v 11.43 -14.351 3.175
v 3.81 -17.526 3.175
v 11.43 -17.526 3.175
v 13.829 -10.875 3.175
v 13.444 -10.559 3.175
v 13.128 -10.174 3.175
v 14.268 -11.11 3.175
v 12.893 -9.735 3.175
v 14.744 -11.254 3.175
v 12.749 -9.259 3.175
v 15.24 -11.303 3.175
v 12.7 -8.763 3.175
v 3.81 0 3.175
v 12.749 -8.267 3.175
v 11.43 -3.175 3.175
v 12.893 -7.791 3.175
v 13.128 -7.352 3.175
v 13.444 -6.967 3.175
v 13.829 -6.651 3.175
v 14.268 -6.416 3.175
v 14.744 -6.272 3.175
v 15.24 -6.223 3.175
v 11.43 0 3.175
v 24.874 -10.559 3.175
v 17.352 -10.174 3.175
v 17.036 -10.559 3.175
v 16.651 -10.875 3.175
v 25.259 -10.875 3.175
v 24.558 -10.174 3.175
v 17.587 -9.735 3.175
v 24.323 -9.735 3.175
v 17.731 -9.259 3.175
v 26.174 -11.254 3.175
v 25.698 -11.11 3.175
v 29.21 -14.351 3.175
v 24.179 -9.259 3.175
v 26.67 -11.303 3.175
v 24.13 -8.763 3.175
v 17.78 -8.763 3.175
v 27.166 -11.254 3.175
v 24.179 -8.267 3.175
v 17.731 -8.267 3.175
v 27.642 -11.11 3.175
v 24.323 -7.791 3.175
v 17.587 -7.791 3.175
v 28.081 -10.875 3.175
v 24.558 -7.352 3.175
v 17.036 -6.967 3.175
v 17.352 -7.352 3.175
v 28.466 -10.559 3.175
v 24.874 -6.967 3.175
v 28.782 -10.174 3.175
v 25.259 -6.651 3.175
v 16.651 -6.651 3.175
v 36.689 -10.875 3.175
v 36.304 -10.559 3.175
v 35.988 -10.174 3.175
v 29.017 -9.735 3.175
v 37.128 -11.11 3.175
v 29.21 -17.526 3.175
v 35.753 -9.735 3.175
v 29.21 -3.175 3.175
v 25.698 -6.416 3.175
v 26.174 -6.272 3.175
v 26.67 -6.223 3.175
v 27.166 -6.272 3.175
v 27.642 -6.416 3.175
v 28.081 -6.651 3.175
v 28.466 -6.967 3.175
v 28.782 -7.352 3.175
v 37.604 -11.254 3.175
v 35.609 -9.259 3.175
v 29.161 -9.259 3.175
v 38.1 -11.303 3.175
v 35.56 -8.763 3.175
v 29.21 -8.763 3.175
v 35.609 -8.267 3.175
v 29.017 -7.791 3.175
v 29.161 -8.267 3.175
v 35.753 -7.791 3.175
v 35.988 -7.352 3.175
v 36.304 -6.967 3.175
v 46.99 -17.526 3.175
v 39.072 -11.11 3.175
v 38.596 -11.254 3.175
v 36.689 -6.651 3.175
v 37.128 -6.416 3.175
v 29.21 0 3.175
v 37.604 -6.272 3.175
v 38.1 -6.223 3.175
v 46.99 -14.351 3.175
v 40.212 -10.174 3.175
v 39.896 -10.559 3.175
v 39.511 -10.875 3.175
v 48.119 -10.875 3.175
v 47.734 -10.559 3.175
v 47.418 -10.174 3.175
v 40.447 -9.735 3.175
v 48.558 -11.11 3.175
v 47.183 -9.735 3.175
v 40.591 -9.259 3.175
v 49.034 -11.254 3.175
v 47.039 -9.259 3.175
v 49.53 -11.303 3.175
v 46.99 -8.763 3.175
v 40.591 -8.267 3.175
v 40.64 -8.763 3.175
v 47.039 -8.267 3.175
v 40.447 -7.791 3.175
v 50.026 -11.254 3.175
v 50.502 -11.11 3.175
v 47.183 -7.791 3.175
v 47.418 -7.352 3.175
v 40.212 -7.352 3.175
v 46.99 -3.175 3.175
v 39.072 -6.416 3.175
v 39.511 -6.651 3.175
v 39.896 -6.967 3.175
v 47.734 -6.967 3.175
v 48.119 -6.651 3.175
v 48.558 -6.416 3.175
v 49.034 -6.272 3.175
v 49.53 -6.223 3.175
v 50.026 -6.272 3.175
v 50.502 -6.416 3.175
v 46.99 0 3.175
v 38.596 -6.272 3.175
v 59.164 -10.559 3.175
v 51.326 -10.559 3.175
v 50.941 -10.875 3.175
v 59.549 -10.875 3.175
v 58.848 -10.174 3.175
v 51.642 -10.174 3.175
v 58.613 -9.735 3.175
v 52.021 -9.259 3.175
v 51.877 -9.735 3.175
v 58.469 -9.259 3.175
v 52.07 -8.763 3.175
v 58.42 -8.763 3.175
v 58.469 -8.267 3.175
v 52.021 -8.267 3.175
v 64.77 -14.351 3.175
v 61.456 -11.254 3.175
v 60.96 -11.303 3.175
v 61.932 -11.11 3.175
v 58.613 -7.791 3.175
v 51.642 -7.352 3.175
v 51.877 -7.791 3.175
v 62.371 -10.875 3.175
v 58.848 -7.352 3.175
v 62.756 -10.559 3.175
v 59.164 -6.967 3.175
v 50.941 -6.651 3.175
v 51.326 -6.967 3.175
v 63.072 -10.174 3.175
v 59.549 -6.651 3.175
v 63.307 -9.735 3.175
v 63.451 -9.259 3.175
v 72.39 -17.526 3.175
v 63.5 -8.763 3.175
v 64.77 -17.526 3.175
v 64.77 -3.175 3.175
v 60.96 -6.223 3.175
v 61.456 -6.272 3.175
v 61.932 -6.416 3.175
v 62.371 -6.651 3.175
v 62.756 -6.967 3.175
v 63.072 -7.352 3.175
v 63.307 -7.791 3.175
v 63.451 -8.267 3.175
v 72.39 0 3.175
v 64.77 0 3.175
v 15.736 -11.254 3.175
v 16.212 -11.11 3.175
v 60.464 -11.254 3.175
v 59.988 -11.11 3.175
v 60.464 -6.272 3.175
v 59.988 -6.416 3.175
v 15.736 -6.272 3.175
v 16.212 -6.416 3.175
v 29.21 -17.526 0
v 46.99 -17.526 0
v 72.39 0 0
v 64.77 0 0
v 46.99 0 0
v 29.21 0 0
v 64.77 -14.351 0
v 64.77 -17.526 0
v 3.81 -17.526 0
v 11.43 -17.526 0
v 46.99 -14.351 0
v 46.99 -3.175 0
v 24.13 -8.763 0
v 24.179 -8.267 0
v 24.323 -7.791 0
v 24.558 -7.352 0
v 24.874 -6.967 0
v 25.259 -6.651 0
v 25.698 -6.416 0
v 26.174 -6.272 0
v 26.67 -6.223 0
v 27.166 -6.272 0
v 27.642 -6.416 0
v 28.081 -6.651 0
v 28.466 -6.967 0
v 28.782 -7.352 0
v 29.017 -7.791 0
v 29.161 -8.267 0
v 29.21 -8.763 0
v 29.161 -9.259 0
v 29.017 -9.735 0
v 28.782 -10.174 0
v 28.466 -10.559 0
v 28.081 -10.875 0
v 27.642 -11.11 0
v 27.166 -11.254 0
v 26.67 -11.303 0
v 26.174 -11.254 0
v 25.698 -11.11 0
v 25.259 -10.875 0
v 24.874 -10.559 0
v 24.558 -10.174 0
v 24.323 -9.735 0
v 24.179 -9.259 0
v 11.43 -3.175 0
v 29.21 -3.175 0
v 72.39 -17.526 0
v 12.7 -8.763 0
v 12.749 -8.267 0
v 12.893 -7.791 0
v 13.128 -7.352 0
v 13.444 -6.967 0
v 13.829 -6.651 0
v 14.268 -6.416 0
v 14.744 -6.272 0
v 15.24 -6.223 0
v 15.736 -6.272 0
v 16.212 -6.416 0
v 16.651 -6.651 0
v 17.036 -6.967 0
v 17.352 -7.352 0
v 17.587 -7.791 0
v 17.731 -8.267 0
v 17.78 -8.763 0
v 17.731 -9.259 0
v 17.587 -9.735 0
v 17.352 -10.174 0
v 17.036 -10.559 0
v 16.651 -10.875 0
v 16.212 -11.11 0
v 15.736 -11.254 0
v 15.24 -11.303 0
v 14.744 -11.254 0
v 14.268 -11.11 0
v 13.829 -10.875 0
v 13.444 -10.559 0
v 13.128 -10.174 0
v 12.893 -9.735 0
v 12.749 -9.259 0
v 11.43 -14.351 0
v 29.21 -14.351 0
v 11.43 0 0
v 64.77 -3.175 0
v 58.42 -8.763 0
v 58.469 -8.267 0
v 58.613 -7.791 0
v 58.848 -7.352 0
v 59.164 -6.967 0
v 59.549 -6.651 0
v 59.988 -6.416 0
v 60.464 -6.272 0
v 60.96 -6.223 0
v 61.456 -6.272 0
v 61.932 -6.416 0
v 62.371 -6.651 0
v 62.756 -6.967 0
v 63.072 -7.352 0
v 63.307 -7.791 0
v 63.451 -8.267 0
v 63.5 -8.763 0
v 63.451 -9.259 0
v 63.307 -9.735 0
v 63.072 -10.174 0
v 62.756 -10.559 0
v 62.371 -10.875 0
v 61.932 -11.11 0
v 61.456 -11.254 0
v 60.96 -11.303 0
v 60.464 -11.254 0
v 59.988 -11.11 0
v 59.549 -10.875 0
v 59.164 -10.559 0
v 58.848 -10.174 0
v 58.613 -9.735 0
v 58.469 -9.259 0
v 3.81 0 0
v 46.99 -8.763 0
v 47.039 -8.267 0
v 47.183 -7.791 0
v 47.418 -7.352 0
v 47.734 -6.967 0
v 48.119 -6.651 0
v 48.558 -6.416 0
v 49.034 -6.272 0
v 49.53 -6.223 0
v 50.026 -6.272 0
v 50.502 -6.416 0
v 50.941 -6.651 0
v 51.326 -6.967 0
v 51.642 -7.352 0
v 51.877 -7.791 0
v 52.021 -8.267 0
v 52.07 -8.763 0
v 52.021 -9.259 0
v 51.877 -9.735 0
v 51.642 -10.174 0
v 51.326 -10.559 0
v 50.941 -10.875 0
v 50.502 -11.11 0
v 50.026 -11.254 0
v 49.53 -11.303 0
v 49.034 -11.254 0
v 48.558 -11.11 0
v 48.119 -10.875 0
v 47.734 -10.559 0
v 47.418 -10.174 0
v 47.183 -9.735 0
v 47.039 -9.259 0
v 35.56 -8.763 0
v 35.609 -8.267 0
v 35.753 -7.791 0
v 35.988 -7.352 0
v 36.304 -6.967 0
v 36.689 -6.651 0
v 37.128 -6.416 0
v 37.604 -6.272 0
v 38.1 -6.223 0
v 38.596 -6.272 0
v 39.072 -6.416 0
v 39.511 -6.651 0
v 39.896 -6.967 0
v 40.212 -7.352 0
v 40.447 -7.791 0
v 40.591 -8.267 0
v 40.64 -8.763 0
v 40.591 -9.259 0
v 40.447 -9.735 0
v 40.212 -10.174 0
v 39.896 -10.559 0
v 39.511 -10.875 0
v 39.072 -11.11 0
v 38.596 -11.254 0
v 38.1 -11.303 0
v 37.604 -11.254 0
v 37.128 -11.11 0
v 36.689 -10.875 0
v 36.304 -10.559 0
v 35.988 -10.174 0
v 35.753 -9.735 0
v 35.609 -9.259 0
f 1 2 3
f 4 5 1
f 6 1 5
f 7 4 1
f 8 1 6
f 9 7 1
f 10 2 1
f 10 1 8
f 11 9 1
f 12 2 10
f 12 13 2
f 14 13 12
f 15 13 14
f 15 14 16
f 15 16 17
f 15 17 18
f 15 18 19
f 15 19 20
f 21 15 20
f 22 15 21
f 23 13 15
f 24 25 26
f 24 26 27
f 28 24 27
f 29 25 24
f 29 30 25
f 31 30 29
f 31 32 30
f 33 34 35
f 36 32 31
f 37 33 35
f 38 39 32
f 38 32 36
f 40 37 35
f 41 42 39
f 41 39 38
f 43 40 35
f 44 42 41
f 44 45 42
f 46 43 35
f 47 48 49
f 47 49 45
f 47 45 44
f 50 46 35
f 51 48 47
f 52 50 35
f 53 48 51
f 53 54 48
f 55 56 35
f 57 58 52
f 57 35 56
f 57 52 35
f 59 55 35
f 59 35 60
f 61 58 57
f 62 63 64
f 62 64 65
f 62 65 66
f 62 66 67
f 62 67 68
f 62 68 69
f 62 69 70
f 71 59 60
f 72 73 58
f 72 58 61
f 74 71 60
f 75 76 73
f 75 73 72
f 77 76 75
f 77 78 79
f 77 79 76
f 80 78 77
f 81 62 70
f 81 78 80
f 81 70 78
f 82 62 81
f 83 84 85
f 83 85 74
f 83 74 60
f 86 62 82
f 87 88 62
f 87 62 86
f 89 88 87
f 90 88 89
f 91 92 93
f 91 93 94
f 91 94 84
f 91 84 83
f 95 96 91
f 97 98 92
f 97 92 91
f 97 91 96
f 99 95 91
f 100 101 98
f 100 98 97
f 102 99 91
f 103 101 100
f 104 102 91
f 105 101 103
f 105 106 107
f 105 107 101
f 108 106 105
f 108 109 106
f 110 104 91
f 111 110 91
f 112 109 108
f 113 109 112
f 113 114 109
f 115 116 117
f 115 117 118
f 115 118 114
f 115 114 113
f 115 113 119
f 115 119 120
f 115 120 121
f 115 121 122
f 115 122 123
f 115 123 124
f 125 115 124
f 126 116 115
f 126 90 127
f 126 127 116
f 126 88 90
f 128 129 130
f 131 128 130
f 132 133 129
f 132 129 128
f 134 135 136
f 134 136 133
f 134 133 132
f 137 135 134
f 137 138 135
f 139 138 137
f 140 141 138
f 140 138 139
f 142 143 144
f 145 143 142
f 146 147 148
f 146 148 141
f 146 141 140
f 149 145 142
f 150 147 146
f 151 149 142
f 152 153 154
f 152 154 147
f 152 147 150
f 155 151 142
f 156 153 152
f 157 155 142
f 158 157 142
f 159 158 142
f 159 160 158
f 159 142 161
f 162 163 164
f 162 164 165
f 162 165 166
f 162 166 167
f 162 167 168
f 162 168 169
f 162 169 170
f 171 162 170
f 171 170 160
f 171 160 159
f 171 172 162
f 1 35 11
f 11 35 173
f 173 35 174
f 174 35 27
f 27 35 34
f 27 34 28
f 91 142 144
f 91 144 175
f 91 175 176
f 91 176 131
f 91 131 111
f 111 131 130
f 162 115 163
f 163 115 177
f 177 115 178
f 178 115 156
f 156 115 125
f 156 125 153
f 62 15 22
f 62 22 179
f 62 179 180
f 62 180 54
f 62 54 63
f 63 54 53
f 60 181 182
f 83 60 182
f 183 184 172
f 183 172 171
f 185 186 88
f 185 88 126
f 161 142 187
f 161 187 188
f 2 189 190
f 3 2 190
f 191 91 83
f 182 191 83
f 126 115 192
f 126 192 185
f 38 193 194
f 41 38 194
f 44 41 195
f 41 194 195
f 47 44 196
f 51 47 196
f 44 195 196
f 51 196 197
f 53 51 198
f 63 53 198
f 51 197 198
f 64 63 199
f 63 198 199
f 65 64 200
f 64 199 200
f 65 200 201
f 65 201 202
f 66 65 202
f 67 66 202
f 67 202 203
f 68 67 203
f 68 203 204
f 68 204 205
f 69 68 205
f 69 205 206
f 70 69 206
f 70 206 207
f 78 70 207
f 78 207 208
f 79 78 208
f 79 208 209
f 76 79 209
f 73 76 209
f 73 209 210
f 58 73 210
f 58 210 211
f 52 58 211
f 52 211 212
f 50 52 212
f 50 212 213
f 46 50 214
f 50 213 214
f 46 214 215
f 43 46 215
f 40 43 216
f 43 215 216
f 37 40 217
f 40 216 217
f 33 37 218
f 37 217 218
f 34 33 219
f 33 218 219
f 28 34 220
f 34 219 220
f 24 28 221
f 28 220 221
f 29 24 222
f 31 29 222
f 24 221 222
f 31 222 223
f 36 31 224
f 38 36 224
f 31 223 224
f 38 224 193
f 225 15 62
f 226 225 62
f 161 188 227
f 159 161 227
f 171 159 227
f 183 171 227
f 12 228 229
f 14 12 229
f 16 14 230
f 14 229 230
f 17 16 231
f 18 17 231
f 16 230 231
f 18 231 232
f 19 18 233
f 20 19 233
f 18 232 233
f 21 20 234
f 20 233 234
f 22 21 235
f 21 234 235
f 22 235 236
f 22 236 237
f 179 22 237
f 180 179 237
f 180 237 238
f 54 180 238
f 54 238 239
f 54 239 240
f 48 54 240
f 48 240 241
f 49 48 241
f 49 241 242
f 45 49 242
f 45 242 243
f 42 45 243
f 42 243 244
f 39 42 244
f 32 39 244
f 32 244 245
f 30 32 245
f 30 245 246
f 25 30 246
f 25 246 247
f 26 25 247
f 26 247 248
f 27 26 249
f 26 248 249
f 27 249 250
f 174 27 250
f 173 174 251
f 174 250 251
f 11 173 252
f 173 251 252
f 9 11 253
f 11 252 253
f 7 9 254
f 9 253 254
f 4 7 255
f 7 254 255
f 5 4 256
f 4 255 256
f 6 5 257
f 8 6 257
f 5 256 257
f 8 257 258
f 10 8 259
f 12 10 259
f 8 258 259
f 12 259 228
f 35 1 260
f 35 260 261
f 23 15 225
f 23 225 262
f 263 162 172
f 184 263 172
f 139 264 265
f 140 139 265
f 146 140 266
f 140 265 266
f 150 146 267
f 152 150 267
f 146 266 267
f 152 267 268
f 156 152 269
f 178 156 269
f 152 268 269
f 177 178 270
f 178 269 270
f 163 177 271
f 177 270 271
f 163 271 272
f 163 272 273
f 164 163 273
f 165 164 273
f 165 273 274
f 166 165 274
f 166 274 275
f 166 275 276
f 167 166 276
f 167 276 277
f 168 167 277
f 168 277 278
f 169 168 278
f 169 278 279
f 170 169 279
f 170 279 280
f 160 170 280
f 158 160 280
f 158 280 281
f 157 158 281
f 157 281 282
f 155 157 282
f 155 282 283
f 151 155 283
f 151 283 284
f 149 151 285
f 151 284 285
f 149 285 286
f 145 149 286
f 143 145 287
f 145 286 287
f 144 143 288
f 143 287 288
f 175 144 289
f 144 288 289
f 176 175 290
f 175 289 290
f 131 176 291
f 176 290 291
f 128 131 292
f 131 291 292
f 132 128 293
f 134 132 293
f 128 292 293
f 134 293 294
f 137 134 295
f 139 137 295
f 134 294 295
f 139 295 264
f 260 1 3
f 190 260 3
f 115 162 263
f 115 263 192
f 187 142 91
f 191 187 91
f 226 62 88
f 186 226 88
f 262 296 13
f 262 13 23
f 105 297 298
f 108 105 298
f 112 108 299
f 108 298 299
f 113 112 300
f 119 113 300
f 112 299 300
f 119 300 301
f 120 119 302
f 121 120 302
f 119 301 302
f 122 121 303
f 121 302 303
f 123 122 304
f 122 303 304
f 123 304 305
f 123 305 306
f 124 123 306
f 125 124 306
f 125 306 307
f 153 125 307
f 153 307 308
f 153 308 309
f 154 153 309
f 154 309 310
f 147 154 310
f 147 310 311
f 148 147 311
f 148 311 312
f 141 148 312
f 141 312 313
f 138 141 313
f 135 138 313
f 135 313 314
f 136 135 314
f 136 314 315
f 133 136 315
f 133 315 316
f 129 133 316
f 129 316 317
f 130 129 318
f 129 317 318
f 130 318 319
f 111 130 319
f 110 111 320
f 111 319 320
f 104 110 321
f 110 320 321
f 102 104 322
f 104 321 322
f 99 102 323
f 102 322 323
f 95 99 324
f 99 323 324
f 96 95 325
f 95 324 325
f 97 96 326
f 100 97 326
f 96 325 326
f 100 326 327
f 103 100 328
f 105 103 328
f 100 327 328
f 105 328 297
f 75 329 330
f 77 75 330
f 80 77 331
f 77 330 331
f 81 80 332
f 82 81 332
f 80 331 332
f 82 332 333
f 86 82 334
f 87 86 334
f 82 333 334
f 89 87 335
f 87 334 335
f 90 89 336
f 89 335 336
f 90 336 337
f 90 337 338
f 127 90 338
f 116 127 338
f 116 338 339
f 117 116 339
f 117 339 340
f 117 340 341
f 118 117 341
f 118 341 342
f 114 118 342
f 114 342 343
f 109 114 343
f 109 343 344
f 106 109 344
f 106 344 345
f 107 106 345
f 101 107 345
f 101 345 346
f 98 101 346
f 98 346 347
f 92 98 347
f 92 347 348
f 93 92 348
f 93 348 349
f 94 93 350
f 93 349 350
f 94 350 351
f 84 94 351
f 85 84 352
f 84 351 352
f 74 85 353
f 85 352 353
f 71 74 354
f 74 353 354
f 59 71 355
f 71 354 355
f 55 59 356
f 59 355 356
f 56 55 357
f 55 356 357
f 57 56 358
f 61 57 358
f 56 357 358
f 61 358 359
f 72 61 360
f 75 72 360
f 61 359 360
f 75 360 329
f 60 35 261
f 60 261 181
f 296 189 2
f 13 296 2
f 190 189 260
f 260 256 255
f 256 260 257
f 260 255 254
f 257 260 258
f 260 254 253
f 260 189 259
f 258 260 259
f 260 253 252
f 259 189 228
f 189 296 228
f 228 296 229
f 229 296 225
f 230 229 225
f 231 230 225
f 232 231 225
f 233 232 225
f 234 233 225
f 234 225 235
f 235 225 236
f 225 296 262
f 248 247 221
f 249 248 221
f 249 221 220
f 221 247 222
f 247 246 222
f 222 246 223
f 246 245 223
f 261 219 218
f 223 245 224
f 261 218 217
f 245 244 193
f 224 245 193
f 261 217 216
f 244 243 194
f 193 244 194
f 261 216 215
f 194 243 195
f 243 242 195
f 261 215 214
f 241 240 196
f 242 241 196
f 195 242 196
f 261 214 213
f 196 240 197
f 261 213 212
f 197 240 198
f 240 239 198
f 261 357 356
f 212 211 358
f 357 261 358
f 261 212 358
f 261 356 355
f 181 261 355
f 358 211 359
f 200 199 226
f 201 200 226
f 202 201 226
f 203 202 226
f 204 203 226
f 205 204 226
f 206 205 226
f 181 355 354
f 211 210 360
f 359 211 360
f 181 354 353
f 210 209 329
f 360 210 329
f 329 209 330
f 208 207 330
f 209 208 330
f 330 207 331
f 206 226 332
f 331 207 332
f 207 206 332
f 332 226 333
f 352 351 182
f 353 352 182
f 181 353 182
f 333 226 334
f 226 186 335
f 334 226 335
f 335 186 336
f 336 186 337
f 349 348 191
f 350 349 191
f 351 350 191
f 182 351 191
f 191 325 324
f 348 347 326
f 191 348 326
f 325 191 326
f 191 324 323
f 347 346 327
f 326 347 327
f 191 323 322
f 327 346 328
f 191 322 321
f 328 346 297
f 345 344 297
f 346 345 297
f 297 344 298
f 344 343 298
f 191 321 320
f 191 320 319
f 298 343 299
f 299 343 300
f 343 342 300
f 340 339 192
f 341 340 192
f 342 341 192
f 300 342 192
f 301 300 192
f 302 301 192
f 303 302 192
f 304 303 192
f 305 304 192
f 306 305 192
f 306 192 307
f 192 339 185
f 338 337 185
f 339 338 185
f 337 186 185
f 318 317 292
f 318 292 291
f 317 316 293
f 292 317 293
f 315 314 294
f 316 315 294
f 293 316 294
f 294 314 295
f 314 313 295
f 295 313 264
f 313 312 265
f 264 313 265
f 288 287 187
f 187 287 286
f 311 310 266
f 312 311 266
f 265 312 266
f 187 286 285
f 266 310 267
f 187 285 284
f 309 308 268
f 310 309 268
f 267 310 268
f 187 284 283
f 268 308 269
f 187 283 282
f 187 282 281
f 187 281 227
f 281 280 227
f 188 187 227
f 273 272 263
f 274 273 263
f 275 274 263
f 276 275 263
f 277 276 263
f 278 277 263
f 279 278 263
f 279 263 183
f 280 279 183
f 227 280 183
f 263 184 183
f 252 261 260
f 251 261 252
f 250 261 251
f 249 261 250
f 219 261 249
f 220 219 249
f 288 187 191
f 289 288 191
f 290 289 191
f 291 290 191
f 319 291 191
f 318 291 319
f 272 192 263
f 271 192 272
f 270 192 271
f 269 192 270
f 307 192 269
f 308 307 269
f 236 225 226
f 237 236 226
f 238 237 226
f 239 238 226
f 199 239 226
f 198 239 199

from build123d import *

# Parameters (mm, degrees)
SKETCH1_W               = 76.2
SKETCH1_H               = 17.526
BOSS_EXTRUDE1_DEPTH     = 3.175
SKETCH2_W               = 17.78
SKETCH2_H               = 3.175
CUT_EXTRUDE1_DEPTH      = 79.2539539
MIRROR2_COPY_1_SKETCH_W = 17.78
MIRROR2_COPY_1_SKETCH_H = 3.175
MIRROR2_COPY_1_DEPTH    = 79.2539539
HOLE1_D                 = 5.08
SKETCH5_W               = 3.175
SKETCH5_H               = 17.526
CUT_EXTRUDE2_DEPTH      = 3.81
SKETCH6_W               = 3.175
SKETCH6_H               = 17.526
CUT_EXTRUDE3_DEPTH      = 3.81


with BuildPart() as part:
    # Sketch1 → Boss-Extrude1 (new body)
    with BuildSketch(Plane.XY):
        with Locations((38.1, -8.763)):
            Rectangle(SKETCH1_W, SKETCH1_H)
    extrude(amount=BOSS_EXTRUDE1_DEPTH)

    # Sketch2 → Cut-Extrude1 (cut, through all)
    with BuildSketch(Plane.XY.offset(3.175)):
        with Locations((20.32, -1.5875)):
            Rectangle(SKETCH2_W, SKETCH2_H)
    cut_extrude1 = extrude(amount=-CUT_EXTRUDE1_DEPTH, mode=Mode.SUBTRACT)

    # Mirror1: Cut-Extrude1 across plane
    add(cut_extrude1.mirror(Plane.ZX.offset(-8.763)), mode=Mode.SUBTRACT)

    # Mirror2: Cut-Extrude1 across plane
    add(cut_extrude1.mirror(Plane(origin=(38.1, 0, 0), x_dir=(0, 0, 1), z_dir=(1, 0, 0))), mode=Mode.SUBTRACT)

    # Mirror2 copy 1 sketch → Mirror2 copy 1 (cut, through all)
    with BuildSketch(Plane(origin=(76.2, -17.526, 3.175), x_dir=(-1, 0, 0), z_dir=(0, 0, 1))):
        with Locations((20.32, -1.5875)):
            Rectangle(MIRROR2_COPY_1_SKETCH_W, MIRROR2_COPY_1_SKETCH_H)
    extrude(amount=-MIRROR2_COPY_1_DEPTH, mode=Mode.SUBTRACT)

    # Hole1 (through all)
    with Locations(Plane.XY.offset(3.175)):
        with Locations((15.24, -8.763), (38.1, -8.763), (26.67, -8.763), (49.53, -8.763), (60.96, -8.763)):
            Hole(HOLE1_D / 2)

    # Sketch5 → Cut-Extrude2 (cut)
    with BuildSketch(Plane.ZY):
        with Locations((1.5875, -8.763)):
            Rectangle(SKETCH5_W, SKETCH5_H)
    extrude(amount=-CUT_EXTRUDE2_DEPTH, mode=Mode.SUBTRACT)

    # Sketch6 → Cut-Extrude3 (cut)
    with BuildSketch(Plane(origin=(76.2, 0, 0), x_dir=(0, 0, -1), z_dir=(1, 0, 0))):
        with Locations((-1.5875, -8.763)):
            Rectangle(SKETCH6_W, SKETCH6_H)
    extrude(amount=-CUT_EXTRUDE3_DEPTH, mode=Mode.SUBTRACT)


solid = part.part
